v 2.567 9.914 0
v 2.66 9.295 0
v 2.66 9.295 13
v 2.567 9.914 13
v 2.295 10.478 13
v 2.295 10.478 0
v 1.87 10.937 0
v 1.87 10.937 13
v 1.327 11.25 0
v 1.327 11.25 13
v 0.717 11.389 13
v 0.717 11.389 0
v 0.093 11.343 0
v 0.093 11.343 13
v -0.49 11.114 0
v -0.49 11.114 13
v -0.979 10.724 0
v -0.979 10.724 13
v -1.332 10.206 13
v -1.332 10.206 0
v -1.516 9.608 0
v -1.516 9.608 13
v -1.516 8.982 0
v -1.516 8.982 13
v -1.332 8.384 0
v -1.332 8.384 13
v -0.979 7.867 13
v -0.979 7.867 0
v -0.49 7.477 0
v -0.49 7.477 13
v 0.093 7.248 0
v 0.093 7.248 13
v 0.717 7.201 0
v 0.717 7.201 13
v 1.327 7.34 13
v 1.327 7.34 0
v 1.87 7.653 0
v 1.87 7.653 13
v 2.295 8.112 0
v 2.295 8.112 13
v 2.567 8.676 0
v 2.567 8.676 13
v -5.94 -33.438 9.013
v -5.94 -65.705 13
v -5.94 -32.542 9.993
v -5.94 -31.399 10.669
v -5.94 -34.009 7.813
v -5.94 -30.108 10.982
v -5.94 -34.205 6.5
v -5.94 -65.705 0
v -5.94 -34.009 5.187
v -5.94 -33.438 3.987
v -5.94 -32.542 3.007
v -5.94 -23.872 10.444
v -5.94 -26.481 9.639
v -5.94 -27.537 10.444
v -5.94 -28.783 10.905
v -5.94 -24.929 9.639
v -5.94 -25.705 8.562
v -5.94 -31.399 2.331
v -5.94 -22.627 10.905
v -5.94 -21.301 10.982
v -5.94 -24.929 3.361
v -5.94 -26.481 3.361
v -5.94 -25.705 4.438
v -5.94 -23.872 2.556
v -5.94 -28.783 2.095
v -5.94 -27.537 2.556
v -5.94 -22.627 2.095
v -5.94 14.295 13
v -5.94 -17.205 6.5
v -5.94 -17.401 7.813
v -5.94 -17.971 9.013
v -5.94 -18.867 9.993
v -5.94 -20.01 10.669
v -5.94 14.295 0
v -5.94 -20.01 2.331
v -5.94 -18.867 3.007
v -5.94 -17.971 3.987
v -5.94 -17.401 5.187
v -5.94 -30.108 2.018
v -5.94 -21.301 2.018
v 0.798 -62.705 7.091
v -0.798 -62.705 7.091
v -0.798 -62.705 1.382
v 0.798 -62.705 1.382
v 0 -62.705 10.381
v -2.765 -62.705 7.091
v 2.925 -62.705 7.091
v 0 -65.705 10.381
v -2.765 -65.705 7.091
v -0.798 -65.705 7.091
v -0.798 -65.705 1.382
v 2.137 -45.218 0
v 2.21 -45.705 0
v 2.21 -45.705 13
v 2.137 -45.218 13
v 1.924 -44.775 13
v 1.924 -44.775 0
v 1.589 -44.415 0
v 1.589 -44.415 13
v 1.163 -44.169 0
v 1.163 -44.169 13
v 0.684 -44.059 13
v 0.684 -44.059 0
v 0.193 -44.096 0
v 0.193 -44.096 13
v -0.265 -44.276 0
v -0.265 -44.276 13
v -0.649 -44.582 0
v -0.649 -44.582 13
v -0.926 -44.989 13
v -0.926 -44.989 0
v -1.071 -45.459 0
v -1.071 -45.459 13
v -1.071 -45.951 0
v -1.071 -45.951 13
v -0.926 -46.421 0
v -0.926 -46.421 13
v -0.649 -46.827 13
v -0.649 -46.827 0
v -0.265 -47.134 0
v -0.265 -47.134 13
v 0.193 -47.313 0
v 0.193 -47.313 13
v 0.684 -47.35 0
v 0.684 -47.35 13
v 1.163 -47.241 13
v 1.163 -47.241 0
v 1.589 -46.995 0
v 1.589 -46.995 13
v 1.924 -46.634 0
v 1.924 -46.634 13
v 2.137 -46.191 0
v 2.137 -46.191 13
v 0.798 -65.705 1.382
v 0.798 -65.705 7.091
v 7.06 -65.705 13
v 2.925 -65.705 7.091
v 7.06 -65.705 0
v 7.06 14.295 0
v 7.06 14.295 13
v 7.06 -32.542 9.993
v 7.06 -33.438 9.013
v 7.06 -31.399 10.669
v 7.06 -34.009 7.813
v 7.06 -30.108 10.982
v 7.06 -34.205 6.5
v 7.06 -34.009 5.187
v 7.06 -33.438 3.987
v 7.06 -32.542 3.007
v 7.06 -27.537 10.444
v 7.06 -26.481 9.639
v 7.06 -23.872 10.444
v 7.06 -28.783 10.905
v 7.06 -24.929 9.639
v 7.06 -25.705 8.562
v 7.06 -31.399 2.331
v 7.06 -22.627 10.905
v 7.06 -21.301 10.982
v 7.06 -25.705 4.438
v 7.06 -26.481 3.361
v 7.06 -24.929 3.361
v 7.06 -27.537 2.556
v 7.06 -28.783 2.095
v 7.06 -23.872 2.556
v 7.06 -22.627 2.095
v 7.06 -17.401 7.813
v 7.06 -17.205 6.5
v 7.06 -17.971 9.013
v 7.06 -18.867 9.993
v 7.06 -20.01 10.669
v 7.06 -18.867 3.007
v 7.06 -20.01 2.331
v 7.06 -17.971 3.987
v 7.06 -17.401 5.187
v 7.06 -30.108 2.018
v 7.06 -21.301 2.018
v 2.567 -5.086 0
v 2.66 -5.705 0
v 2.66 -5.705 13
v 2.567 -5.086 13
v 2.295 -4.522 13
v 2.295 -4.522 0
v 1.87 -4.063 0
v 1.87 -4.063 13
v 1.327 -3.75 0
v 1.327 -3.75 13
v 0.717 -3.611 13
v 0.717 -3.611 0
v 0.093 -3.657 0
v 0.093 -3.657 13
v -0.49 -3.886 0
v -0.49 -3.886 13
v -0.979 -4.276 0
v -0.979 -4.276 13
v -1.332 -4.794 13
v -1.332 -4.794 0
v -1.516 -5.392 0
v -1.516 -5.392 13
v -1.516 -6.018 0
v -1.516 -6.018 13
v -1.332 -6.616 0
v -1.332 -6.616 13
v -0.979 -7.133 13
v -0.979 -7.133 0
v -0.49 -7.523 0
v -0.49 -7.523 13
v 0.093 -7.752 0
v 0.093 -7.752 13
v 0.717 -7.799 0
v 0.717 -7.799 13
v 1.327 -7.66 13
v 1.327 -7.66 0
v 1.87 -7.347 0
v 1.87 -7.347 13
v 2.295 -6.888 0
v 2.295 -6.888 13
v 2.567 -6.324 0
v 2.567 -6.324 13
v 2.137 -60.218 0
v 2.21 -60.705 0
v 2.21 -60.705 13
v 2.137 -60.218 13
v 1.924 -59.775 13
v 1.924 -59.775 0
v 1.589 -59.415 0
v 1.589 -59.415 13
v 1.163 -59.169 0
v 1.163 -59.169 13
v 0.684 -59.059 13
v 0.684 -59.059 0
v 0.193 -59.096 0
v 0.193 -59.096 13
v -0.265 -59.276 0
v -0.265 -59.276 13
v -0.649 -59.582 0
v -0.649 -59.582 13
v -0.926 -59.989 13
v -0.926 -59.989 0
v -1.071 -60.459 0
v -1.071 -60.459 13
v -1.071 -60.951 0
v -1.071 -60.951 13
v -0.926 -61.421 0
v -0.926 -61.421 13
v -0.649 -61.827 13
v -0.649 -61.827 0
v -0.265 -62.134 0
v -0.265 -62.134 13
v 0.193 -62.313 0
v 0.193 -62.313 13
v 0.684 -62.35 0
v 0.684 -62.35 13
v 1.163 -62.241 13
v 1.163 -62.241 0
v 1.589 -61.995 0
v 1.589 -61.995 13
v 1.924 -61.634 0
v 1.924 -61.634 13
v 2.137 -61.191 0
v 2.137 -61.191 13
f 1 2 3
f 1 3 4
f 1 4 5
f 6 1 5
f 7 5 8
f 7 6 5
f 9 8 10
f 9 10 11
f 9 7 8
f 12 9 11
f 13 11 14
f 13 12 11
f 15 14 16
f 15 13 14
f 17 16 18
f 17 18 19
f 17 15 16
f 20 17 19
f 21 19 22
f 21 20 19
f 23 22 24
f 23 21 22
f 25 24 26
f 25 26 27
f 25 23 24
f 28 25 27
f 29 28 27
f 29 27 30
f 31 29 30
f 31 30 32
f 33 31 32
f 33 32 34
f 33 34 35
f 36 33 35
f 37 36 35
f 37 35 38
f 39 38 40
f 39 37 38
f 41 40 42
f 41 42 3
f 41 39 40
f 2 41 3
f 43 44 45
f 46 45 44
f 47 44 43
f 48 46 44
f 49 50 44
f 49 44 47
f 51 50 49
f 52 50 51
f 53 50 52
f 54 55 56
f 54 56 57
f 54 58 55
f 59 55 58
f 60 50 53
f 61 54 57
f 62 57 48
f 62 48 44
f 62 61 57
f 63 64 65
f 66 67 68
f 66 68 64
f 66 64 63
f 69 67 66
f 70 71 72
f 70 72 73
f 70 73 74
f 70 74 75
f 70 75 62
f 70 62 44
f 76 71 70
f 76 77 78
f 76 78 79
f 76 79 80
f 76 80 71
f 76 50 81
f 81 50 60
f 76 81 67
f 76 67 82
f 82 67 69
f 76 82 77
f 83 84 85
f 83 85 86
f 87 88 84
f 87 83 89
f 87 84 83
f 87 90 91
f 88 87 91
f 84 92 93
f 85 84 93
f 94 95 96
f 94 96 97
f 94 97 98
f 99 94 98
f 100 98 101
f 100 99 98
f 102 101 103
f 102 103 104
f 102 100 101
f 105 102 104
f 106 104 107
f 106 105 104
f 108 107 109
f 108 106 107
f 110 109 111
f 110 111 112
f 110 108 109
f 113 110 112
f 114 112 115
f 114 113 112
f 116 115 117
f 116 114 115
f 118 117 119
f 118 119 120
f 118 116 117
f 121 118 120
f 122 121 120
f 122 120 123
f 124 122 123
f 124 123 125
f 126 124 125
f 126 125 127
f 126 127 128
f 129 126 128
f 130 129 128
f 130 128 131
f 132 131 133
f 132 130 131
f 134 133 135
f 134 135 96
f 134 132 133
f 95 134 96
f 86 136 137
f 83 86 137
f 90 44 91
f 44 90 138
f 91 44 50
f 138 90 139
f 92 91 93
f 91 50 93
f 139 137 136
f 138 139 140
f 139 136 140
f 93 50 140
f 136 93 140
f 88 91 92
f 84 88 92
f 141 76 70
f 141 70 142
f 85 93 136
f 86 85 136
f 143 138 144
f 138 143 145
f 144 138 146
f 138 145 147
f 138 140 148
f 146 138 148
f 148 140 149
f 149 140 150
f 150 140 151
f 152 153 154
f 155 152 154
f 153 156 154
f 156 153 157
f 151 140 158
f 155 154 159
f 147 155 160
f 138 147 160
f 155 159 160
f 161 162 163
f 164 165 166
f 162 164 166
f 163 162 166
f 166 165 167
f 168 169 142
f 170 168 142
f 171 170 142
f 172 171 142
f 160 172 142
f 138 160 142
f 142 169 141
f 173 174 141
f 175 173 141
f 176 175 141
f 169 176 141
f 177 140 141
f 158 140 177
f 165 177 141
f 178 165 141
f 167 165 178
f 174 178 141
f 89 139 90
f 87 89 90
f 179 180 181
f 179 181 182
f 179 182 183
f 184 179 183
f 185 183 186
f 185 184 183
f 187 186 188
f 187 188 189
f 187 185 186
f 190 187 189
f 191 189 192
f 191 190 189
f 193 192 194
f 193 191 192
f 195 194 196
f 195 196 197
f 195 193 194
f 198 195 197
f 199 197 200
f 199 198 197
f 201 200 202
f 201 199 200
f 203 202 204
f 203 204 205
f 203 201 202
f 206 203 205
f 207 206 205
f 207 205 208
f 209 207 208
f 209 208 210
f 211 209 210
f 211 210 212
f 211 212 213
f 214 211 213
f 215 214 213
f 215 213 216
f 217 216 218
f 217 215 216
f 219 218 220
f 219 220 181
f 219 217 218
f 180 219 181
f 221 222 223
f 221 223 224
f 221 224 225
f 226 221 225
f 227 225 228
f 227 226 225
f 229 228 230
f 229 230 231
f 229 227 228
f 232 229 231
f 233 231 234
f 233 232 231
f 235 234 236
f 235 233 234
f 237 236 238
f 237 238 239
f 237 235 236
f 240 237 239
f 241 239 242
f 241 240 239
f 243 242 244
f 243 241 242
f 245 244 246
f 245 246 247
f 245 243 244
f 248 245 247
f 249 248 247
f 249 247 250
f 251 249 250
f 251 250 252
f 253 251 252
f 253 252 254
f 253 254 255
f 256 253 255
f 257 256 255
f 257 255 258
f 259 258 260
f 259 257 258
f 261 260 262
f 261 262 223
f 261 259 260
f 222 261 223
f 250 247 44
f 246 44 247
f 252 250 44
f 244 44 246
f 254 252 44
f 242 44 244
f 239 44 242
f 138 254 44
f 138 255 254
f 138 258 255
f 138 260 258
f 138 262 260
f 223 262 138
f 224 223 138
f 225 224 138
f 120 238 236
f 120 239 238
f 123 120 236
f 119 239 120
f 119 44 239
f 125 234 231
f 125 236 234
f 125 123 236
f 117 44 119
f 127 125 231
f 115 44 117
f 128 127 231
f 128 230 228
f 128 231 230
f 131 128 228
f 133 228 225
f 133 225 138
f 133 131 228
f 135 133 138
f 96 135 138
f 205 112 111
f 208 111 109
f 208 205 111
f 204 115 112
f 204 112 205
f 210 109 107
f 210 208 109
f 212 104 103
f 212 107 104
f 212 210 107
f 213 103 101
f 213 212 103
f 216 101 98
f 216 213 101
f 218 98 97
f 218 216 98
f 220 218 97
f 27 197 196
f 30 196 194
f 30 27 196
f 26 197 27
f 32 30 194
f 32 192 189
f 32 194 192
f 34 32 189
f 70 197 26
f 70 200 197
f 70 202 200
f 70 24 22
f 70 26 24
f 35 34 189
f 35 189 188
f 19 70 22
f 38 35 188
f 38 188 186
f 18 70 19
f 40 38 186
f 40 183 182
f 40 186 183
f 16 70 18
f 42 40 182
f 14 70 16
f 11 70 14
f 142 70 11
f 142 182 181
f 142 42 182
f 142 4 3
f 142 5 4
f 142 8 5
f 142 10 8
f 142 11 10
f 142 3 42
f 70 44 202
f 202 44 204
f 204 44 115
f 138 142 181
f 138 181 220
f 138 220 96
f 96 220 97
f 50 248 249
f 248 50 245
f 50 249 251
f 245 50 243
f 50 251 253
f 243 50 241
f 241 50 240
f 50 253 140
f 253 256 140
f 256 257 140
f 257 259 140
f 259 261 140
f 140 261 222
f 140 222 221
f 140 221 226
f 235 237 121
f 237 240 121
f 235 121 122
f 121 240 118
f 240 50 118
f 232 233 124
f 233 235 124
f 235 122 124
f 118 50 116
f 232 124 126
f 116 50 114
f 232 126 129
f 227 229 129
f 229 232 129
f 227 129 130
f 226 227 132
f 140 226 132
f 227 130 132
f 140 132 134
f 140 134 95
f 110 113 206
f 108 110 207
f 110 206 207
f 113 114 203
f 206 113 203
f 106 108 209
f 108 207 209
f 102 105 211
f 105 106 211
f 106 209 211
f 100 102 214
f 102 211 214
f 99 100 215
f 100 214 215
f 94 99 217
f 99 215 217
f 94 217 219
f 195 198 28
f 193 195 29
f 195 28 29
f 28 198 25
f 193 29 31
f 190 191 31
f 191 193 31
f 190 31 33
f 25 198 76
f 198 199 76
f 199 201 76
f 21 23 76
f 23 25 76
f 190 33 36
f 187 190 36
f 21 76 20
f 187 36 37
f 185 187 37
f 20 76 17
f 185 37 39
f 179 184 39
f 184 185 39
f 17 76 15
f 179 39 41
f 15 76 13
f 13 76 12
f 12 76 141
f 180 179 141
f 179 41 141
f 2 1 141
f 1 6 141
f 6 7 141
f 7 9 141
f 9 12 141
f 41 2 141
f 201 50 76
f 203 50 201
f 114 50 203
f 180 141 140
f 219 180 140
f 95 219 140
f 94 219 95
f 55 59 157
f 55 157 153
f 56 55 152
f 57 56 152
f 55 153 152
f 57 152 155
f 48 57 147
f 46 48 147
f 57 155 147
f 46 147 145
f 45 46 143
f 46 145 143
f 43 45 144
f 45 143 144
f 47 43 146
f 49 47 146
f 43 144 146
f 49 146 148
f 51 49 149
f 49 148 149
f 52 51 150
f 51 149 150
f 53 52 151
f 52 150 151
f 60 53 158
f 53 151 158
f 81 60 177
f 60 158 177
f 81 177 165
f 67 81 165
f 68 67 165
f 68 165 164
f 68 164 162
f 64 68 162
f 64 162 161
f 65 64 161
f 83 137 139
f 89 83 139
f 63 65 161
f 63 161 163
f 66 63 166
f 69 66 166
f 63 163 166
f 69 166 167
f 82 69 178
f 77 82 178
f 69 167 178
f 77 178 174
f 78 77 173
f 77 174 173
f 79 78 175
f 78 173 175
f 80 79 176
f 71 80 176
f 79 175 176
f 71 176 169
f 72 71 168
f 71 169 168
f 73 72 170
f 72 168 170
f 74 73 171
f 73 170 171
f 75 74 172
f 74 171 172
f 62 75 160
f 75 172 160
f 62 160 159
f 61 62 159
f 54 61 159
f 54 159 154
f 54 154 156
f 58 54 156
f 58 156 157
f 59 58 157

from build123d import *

# Parameters (mm, degrees)
SKETCH_1_W          = 13
SKETCH_1_H          = 80
SKETCH_1_R          = 2.1
SKETCH_1_R_2        = 1.65
EXTRUDE_1_DEPTH     = 13
CUT_EXTRUDE_4_DEPTH = 13
CUT_EXTRUDE_5_DEPTH = 3


with BuildPart() as part:
    # 草图1 → 凸台-拉伸1 (new body)
    with BuildSketch(Plane.XY):
        with Locations((0.560222304, -25.704710145)):
            Rectangle(SKETCH_1_W, SKETCH_1_H)
        with Locations((0.560222304, 9.295289855)):
            Circle(SKETCH_1_R, mode=Mode.SUBTRACT)
        with Locations((0.560222304, -5.704710145)):
            Circle(SKETCH_1_R, mode=Mode.SUBTRACT)
        with Locations((0.560222304, -60.704710145)):
            Circle(SKETCH_1_R_2, mode=Mode.SUBTRACT)
        with Locations((0.560222304, -45.704710145)):
            Circle(SKETCH_1_R_2, mode=Mode.SUBTRACT)
    extrude(amount=EXTRUDE_1_DEPTH)

    # 草图4 → 切除-拉伸4 (cut)
    with BuildSketch(Plane(origin=(7.060222304, 0, 0), x_dir=(0, 0, -1), z_dir=(1, 0, 0))):
        with BuildLine():
            ThreePointArc((-4.438447187, -25.704710145), (-6.5, -17.204710145), (-8.561552813, -25.704710145))
            ThreePointArc((-8.561552813, -25.704710145), (-6.5, -34.204710145), (-4.438447187, -25.704710145))
        make_face()
    extrude(amount=-CUT_EXTRUDE_4_DEPTH, mode=Mode.SUBTRACT)

    # 草图5 → 切除-拉伸5 (cut)
    with BuildSketch(Plane.XZ.offset(65.704710145)):
        Polygon((0, 10.380755621), (-2.765074416, 7.090643354), (-0.798384611, 7.090643354), (-0.798384611, 1.381735054), (0.79750081, 1.381735054), (0.79750081, 7.090643354), (2.925348038, 7.090643354), align=None)
    extrude(amount=-CUT_EXTRUDE_5_DEPTH, mode=Mode.SUBTRACT)


solid = part.part
